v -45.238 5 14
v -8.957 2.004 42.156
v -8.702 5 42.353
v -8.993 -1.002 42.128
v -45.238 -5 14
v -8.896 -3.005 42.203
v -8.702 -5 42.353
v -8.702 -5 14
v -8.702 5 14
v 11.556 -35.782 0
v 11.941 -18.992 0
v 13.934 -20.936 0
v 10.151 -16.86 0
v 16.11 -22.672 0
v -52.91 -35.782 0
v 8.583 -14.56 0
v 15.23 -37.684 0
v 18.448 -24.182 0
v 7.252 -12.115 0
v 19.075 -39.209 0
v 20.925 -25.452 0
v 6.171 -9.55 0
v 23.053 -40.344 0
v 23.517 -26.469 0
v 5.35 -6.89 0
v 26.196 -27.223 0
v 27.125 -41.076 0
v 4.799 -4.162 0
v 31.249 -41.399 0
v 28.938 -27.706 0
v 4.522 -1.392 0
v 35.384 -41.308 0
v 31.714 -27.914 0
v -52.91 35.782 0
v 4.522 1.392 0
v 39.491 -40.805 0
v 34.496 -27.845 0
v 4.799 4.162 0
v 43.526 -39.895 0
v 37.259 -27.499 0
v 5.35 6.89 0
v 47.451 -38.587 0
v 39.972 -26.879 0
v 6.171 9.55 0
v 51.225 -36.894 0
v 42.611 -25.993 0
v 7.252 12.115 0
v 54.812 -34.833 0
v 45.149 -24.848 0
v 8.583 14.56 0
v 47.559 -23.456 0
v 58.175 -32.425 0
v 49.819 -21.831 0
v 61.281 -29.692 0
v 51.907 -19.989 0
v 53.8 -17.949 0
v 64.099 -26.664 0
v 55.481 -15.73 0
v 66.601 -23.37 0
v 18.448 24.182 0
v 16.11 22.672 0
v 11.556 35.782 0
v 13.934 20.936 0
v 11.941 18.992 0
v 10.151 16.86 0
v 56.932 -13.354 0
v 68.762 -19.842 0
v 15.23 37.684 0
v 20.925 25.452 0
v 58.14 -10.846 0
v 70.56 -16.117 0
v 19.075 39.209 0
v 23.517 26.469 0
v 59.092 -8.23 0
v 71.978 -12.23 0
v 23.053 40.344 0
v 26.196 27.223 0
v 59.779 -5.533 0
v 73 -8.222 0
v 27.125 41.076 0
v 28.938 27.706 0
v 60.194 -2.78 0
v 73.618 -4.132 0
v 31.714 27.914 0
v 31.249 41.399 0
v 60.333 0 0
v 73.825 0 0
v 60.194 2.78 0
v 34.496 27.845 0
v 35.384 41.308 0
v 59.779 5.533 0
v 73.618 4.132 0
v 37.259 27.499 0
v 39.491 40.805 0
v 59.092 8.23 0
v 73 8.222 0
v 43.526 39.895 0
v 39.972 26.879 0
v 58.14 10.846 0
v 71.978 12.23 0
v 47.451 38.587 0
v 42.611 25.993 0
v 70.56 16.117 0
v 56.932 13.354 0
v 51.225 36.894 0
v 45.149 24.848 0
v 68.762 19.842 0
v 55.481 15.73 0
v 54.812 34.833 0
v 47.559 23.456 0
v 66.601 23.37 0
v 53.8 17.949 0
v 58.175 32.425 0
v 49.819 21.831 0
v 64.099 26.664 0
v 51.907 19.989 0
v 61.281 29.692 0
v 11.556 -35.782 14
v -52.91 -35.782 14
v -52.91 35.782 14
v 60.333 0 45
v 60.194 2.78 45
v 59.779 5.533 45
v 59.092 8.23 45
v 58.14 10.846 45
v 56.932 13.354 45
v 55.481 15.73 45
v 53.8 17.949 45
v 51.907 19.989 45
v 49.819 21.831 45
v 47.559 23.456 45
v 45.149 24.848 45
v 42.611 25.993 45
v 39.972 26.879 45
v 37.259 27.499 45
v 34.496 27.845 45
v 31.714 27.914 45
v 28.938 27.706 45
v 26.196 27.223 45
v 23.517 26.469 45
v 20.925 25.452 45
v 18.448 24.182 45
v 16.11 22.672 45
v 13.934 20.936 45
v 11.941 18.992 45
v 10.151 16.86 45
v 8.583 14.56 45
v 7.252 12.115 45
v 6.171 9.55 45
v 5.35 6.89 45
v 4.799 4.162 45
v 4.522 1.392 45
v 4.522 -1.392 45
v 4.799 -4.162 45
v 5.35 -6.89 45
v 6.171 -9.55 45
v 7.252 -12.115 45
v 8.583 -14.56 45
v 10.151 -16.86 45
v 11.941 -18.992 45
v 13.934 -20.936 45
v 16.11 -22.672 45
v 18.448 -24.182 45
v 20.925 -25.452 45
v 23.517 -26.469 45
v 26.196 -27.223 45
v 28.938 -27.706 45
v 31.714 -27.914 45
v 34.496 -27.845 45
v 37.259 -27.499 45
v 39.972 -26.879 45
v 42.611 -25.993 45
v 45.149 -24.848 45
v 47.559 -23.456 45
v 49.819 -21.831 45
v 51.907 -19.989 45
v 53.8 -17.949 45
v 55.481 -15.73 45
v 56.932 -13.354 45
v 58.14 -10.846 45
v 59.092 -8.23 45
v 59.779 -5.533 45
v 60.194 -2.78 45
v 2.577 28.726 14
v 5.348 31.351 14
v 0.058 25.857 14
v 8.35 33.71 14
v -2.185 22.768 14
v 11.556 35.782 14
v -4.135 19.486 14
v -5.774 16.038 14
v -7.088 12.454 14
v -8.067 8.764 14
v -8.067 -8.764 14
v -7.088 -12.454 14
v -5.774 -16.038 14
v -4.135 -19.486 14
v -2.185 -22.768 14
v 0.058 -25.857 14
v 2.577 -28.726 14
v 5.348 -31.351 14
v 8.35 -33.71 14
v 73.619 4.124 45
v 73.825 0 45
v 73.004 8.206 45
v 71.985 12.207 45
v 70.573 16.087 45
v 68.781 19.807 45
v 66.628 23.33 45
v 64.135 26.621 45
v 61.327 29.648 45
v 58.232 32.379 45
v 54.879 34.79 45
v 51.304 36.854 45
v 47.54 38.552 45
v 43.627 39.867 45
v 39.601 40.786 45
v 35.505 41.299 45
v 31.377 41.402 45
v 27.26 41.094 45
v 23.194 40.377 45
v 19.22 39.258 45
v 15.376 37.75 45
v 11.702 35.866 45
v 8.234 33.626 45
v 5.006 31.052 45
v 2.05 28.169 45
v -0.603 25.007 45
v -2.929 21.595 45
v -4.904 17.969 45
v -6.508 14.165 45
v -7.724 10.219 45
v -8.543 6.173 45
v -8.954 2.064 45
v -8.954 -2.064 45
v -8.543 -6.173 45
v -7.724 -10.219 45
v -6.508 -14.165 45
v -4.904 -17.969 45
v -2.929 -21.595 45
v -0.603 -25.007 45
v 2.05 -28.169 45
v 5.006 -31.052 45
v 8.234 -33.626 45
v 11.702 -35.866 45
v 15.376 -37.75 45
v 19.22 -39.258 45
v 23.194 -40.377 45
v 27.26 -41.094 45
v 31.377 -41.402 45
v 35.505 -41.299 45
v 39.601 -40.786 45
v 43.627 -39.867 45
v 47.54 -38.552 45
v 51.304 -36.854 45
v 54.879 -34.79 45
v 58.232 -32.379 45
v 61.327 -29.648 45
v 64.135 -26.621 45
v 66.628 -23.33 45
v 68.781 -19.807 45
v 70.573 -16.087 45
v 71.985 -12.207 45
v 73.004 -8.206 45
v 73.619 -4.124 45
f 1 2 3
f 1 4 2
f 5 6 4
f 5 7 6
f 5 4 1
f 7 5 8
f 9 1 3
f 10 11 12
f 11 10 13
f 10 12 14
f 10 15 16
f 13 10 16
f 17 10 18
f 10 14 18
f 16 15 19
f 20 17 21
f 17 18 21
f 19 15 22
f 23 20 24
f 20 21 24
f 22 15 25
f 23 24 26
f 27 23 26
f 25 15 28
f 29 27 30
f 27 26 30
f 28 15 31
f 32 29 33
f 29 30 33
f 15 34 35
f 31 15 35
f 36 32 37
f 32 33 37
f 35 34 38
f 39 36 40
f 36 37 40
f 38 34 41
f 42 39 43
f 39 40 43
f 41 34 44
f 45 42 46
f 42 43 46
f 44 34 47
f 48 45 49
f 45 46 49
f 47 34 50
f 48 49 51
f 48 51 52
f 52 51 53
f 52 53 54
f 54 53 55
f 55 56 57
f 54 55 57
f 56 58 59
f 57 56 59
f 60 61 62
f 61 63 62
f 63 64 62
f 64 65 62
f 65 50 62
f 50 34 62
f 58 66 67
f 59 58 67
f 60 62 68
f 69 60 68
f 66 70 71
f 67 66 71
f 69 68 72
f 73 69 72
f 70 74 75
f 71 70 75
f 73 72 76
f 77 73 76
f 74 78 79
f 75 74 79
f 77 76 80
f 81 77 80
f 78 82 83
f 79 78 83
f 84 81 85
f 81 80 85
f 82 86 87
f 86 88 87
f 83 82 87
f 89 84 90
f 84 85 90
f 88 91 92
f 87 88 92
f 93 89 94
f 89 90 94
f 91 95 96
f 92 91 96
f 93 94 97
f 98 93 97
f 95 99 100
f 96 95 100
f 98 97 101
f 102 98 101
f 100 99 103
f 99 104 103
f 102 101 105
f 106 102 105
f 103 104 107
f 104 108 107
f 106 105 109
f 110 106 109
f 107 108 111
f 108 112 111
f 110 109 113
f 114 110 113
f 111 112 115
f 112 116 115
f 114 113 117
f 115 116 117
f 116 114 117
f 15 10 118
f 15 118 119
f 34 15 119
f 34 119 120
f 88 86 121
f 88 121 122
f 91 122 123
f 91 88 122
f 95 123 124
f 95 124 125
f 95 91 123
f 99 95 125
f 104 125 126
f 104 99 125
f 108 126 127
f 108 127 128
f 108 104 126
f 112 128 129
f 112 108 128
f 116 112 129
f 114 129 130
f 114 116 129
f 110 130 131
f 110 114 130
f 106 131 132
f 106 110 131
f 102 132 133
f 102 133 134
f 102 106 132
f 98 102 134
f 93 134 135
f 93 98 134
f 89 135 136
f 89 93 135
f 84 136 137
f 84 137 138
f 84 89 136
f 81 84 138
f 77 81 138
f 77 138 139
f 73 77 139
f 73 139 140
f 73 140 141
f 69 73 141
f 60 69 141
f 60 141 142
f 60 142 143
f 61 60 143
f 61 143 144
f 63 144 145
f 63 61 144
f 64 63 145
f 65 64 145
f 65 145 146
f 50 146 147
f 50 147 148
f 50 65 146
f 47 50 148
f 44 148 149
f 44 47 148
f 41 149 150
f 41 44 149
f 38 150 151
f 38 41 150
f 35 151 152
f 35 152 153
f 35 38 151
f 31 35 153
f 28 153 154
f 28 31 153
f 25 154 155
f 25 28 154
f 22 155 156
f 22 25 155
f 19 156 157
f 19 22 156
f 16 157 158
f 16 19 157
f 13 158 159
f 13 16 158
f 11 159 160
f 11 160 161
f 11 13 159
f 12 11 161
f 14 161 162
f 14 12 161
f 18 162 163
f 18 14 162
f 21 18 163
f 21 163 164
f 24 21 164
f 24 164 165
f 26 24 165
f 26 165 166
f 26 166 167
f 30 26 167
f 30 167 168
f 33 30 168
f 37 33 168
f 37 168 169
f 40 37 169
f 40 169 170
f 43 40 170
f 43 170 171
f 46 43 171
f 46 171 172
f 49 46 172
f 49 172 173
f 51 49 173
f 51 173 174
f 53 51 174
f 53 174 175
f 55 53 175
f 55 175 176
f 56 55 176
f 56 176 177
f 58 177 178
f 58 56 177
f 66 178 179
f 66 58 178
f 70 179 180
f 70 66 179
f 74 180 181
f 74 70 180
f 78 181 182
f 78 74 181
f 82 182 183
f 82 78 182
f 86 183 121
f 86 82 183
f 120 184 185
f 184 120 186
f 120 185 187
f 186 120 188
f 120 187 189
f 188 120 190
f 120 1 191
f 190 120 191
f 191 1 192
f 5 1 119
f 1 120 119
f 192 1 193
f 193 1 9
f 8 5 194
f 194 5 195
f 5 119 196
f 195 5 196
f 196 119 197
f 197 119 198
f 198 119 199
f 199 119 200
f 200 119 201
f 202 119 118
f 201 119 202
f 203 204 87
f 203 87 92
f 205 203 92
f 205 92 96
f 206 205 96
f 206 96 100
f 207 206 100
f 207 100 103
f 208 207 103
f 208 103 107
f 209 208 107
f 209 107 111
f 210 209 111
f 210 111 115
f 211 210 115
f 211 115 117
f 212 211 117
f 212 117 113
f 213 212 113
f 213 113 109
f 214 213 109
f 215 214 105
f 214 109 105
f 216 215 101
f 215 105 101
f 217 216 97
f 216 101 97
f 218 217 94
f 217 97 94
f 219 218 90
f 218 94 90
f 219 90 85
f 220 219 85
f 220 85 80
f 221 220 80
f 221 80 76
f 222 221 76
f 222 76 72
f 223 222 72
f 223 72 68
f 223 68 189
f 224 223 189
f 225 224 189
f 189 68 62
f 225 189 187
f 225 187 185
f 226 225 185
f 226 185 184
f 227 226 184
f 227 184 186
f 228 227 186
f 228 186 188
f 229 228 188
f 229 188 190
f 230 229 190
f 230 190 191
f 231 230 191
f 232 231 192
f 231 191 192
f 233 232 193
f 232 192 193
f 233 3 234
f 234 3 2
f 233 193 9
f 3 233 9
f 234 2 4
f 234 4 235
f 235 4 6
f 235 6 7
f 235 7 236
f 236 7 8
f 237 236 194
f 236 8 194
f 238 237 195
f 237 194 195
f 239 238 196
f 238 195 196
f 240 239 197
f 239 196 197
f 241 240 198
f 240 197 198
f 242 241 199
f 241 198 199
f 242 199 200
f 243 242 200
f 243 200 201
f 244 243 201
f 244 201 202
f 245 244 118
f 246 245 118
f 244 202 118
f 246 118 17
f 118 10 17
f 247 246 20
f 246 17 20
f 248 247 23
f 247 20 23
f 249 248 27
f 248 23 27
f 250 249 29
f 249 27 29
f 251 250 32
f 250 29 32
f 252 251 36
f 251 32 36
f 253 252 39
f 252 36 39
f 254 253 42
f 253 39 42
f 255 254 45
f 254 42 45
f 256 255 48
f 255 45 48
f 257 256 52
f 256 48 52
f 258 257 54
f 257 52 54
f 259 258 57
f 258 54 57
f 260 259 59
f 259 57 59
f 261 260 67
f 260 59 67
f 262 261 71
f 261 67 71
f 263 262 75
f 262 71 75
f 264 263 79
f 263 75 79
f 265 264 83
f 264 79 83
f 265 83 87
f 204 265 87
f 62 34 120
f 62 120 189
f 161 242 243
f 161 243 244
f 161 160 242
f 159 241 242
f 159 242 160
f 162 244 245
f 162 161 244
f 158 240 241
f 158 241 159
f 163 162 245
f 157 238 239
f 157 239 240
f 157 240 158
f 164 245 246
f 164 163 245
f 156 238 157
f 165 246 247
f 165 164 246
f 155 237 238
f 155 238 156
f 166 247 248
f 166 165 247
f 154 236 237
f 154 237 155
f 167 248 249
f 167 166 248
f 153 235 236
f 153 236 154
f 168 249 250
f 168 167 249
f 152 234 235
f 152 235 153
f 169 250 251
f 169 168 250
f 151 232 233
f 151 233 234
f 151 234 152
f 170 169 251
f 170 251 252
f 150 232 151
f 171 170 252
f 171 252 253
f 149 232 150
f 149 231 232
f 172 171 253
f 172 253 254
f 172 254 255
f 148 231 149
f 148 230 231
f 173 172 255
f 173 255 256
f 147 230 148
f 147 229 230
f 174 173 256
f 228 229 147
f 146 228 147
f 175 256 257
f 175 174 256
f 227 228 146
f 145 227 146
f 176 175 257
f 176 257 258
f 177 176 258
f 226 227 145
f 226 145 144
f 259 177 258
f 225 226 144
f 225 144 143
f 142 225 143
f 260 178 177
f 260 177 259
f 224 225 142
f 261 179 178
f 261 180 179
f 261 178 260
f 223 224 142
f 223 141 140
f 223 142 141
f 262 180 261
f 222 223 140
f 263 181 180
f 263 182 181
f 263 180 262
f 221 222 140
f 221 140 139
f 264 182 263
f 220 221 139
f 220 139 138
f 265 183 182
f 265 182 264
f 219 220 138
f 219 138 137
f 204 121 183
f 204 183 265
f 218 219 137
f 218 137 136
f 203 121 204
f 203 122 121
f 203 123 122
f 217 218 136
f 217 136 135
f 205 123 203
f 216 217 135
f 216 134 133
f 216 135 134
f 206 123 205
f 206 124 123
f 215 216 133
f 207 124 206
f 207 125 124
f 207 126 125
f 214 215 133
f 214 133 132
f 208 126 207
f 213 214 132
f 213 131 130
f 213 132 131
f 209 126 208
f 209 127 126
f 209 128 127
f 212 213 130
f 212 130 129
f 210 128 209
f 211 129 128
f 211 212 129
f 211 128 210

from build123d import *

# Parameters (mm, degrees)
F0_R     = 41.4149264742
F0_R_2   = 27.9229275401
F1_DEPTH = 45
F3_DEPTH = 14
F5_DEPTH = 5


with BuildPart() as f1:
    # F0 (on Top) → F1 (new body)
    with BuildSketch(Plane.XY):
        with Locations((32.4097648263, 0)):
            Circle(F0_R)
        with Locations((32.4097648263, 0)):
            Circle(F0_R_2, mode=Mode.SUBTRACT)
    extrude(amount=F1_DEPTH)

    # F2 (on face) → F3 (join)
    with BuildSketch(Plane(origin=(0, 0, 0), x_dir=(1, 0, 0), z_dir=(0, 0, -1))):
        with BuildLine():
            Line((-52.9098688311, -35.7817081915), (11.5563360013, -35.7817081915))
            ThreePointArc((11.5563360013, -35.7817081915), (-9.0051616479, 0), (11.5563360013, 35.7817081915))
            Line((11.5563360013, 35.7817081915), (-52.9098688311, 35.7817081915))
            Line((-52.9098688311, 35.7817081915), (-52.9098688311, -35.7817081915))
        make_face()
    extrude(amount=-F3_DEPTH)

    # F4 (on Front) → F5 (join, symmetric)
    with BuildSketch(Plane.XZ):
        Polygon((-6.9038993679, 43.7489598989), (-47.6915575564, 12.0960362256), (-6.9038993679, 12.0960362256), align=None)
    extrude(amount=F5_DEPTH, both=True)


solid = f1.part
